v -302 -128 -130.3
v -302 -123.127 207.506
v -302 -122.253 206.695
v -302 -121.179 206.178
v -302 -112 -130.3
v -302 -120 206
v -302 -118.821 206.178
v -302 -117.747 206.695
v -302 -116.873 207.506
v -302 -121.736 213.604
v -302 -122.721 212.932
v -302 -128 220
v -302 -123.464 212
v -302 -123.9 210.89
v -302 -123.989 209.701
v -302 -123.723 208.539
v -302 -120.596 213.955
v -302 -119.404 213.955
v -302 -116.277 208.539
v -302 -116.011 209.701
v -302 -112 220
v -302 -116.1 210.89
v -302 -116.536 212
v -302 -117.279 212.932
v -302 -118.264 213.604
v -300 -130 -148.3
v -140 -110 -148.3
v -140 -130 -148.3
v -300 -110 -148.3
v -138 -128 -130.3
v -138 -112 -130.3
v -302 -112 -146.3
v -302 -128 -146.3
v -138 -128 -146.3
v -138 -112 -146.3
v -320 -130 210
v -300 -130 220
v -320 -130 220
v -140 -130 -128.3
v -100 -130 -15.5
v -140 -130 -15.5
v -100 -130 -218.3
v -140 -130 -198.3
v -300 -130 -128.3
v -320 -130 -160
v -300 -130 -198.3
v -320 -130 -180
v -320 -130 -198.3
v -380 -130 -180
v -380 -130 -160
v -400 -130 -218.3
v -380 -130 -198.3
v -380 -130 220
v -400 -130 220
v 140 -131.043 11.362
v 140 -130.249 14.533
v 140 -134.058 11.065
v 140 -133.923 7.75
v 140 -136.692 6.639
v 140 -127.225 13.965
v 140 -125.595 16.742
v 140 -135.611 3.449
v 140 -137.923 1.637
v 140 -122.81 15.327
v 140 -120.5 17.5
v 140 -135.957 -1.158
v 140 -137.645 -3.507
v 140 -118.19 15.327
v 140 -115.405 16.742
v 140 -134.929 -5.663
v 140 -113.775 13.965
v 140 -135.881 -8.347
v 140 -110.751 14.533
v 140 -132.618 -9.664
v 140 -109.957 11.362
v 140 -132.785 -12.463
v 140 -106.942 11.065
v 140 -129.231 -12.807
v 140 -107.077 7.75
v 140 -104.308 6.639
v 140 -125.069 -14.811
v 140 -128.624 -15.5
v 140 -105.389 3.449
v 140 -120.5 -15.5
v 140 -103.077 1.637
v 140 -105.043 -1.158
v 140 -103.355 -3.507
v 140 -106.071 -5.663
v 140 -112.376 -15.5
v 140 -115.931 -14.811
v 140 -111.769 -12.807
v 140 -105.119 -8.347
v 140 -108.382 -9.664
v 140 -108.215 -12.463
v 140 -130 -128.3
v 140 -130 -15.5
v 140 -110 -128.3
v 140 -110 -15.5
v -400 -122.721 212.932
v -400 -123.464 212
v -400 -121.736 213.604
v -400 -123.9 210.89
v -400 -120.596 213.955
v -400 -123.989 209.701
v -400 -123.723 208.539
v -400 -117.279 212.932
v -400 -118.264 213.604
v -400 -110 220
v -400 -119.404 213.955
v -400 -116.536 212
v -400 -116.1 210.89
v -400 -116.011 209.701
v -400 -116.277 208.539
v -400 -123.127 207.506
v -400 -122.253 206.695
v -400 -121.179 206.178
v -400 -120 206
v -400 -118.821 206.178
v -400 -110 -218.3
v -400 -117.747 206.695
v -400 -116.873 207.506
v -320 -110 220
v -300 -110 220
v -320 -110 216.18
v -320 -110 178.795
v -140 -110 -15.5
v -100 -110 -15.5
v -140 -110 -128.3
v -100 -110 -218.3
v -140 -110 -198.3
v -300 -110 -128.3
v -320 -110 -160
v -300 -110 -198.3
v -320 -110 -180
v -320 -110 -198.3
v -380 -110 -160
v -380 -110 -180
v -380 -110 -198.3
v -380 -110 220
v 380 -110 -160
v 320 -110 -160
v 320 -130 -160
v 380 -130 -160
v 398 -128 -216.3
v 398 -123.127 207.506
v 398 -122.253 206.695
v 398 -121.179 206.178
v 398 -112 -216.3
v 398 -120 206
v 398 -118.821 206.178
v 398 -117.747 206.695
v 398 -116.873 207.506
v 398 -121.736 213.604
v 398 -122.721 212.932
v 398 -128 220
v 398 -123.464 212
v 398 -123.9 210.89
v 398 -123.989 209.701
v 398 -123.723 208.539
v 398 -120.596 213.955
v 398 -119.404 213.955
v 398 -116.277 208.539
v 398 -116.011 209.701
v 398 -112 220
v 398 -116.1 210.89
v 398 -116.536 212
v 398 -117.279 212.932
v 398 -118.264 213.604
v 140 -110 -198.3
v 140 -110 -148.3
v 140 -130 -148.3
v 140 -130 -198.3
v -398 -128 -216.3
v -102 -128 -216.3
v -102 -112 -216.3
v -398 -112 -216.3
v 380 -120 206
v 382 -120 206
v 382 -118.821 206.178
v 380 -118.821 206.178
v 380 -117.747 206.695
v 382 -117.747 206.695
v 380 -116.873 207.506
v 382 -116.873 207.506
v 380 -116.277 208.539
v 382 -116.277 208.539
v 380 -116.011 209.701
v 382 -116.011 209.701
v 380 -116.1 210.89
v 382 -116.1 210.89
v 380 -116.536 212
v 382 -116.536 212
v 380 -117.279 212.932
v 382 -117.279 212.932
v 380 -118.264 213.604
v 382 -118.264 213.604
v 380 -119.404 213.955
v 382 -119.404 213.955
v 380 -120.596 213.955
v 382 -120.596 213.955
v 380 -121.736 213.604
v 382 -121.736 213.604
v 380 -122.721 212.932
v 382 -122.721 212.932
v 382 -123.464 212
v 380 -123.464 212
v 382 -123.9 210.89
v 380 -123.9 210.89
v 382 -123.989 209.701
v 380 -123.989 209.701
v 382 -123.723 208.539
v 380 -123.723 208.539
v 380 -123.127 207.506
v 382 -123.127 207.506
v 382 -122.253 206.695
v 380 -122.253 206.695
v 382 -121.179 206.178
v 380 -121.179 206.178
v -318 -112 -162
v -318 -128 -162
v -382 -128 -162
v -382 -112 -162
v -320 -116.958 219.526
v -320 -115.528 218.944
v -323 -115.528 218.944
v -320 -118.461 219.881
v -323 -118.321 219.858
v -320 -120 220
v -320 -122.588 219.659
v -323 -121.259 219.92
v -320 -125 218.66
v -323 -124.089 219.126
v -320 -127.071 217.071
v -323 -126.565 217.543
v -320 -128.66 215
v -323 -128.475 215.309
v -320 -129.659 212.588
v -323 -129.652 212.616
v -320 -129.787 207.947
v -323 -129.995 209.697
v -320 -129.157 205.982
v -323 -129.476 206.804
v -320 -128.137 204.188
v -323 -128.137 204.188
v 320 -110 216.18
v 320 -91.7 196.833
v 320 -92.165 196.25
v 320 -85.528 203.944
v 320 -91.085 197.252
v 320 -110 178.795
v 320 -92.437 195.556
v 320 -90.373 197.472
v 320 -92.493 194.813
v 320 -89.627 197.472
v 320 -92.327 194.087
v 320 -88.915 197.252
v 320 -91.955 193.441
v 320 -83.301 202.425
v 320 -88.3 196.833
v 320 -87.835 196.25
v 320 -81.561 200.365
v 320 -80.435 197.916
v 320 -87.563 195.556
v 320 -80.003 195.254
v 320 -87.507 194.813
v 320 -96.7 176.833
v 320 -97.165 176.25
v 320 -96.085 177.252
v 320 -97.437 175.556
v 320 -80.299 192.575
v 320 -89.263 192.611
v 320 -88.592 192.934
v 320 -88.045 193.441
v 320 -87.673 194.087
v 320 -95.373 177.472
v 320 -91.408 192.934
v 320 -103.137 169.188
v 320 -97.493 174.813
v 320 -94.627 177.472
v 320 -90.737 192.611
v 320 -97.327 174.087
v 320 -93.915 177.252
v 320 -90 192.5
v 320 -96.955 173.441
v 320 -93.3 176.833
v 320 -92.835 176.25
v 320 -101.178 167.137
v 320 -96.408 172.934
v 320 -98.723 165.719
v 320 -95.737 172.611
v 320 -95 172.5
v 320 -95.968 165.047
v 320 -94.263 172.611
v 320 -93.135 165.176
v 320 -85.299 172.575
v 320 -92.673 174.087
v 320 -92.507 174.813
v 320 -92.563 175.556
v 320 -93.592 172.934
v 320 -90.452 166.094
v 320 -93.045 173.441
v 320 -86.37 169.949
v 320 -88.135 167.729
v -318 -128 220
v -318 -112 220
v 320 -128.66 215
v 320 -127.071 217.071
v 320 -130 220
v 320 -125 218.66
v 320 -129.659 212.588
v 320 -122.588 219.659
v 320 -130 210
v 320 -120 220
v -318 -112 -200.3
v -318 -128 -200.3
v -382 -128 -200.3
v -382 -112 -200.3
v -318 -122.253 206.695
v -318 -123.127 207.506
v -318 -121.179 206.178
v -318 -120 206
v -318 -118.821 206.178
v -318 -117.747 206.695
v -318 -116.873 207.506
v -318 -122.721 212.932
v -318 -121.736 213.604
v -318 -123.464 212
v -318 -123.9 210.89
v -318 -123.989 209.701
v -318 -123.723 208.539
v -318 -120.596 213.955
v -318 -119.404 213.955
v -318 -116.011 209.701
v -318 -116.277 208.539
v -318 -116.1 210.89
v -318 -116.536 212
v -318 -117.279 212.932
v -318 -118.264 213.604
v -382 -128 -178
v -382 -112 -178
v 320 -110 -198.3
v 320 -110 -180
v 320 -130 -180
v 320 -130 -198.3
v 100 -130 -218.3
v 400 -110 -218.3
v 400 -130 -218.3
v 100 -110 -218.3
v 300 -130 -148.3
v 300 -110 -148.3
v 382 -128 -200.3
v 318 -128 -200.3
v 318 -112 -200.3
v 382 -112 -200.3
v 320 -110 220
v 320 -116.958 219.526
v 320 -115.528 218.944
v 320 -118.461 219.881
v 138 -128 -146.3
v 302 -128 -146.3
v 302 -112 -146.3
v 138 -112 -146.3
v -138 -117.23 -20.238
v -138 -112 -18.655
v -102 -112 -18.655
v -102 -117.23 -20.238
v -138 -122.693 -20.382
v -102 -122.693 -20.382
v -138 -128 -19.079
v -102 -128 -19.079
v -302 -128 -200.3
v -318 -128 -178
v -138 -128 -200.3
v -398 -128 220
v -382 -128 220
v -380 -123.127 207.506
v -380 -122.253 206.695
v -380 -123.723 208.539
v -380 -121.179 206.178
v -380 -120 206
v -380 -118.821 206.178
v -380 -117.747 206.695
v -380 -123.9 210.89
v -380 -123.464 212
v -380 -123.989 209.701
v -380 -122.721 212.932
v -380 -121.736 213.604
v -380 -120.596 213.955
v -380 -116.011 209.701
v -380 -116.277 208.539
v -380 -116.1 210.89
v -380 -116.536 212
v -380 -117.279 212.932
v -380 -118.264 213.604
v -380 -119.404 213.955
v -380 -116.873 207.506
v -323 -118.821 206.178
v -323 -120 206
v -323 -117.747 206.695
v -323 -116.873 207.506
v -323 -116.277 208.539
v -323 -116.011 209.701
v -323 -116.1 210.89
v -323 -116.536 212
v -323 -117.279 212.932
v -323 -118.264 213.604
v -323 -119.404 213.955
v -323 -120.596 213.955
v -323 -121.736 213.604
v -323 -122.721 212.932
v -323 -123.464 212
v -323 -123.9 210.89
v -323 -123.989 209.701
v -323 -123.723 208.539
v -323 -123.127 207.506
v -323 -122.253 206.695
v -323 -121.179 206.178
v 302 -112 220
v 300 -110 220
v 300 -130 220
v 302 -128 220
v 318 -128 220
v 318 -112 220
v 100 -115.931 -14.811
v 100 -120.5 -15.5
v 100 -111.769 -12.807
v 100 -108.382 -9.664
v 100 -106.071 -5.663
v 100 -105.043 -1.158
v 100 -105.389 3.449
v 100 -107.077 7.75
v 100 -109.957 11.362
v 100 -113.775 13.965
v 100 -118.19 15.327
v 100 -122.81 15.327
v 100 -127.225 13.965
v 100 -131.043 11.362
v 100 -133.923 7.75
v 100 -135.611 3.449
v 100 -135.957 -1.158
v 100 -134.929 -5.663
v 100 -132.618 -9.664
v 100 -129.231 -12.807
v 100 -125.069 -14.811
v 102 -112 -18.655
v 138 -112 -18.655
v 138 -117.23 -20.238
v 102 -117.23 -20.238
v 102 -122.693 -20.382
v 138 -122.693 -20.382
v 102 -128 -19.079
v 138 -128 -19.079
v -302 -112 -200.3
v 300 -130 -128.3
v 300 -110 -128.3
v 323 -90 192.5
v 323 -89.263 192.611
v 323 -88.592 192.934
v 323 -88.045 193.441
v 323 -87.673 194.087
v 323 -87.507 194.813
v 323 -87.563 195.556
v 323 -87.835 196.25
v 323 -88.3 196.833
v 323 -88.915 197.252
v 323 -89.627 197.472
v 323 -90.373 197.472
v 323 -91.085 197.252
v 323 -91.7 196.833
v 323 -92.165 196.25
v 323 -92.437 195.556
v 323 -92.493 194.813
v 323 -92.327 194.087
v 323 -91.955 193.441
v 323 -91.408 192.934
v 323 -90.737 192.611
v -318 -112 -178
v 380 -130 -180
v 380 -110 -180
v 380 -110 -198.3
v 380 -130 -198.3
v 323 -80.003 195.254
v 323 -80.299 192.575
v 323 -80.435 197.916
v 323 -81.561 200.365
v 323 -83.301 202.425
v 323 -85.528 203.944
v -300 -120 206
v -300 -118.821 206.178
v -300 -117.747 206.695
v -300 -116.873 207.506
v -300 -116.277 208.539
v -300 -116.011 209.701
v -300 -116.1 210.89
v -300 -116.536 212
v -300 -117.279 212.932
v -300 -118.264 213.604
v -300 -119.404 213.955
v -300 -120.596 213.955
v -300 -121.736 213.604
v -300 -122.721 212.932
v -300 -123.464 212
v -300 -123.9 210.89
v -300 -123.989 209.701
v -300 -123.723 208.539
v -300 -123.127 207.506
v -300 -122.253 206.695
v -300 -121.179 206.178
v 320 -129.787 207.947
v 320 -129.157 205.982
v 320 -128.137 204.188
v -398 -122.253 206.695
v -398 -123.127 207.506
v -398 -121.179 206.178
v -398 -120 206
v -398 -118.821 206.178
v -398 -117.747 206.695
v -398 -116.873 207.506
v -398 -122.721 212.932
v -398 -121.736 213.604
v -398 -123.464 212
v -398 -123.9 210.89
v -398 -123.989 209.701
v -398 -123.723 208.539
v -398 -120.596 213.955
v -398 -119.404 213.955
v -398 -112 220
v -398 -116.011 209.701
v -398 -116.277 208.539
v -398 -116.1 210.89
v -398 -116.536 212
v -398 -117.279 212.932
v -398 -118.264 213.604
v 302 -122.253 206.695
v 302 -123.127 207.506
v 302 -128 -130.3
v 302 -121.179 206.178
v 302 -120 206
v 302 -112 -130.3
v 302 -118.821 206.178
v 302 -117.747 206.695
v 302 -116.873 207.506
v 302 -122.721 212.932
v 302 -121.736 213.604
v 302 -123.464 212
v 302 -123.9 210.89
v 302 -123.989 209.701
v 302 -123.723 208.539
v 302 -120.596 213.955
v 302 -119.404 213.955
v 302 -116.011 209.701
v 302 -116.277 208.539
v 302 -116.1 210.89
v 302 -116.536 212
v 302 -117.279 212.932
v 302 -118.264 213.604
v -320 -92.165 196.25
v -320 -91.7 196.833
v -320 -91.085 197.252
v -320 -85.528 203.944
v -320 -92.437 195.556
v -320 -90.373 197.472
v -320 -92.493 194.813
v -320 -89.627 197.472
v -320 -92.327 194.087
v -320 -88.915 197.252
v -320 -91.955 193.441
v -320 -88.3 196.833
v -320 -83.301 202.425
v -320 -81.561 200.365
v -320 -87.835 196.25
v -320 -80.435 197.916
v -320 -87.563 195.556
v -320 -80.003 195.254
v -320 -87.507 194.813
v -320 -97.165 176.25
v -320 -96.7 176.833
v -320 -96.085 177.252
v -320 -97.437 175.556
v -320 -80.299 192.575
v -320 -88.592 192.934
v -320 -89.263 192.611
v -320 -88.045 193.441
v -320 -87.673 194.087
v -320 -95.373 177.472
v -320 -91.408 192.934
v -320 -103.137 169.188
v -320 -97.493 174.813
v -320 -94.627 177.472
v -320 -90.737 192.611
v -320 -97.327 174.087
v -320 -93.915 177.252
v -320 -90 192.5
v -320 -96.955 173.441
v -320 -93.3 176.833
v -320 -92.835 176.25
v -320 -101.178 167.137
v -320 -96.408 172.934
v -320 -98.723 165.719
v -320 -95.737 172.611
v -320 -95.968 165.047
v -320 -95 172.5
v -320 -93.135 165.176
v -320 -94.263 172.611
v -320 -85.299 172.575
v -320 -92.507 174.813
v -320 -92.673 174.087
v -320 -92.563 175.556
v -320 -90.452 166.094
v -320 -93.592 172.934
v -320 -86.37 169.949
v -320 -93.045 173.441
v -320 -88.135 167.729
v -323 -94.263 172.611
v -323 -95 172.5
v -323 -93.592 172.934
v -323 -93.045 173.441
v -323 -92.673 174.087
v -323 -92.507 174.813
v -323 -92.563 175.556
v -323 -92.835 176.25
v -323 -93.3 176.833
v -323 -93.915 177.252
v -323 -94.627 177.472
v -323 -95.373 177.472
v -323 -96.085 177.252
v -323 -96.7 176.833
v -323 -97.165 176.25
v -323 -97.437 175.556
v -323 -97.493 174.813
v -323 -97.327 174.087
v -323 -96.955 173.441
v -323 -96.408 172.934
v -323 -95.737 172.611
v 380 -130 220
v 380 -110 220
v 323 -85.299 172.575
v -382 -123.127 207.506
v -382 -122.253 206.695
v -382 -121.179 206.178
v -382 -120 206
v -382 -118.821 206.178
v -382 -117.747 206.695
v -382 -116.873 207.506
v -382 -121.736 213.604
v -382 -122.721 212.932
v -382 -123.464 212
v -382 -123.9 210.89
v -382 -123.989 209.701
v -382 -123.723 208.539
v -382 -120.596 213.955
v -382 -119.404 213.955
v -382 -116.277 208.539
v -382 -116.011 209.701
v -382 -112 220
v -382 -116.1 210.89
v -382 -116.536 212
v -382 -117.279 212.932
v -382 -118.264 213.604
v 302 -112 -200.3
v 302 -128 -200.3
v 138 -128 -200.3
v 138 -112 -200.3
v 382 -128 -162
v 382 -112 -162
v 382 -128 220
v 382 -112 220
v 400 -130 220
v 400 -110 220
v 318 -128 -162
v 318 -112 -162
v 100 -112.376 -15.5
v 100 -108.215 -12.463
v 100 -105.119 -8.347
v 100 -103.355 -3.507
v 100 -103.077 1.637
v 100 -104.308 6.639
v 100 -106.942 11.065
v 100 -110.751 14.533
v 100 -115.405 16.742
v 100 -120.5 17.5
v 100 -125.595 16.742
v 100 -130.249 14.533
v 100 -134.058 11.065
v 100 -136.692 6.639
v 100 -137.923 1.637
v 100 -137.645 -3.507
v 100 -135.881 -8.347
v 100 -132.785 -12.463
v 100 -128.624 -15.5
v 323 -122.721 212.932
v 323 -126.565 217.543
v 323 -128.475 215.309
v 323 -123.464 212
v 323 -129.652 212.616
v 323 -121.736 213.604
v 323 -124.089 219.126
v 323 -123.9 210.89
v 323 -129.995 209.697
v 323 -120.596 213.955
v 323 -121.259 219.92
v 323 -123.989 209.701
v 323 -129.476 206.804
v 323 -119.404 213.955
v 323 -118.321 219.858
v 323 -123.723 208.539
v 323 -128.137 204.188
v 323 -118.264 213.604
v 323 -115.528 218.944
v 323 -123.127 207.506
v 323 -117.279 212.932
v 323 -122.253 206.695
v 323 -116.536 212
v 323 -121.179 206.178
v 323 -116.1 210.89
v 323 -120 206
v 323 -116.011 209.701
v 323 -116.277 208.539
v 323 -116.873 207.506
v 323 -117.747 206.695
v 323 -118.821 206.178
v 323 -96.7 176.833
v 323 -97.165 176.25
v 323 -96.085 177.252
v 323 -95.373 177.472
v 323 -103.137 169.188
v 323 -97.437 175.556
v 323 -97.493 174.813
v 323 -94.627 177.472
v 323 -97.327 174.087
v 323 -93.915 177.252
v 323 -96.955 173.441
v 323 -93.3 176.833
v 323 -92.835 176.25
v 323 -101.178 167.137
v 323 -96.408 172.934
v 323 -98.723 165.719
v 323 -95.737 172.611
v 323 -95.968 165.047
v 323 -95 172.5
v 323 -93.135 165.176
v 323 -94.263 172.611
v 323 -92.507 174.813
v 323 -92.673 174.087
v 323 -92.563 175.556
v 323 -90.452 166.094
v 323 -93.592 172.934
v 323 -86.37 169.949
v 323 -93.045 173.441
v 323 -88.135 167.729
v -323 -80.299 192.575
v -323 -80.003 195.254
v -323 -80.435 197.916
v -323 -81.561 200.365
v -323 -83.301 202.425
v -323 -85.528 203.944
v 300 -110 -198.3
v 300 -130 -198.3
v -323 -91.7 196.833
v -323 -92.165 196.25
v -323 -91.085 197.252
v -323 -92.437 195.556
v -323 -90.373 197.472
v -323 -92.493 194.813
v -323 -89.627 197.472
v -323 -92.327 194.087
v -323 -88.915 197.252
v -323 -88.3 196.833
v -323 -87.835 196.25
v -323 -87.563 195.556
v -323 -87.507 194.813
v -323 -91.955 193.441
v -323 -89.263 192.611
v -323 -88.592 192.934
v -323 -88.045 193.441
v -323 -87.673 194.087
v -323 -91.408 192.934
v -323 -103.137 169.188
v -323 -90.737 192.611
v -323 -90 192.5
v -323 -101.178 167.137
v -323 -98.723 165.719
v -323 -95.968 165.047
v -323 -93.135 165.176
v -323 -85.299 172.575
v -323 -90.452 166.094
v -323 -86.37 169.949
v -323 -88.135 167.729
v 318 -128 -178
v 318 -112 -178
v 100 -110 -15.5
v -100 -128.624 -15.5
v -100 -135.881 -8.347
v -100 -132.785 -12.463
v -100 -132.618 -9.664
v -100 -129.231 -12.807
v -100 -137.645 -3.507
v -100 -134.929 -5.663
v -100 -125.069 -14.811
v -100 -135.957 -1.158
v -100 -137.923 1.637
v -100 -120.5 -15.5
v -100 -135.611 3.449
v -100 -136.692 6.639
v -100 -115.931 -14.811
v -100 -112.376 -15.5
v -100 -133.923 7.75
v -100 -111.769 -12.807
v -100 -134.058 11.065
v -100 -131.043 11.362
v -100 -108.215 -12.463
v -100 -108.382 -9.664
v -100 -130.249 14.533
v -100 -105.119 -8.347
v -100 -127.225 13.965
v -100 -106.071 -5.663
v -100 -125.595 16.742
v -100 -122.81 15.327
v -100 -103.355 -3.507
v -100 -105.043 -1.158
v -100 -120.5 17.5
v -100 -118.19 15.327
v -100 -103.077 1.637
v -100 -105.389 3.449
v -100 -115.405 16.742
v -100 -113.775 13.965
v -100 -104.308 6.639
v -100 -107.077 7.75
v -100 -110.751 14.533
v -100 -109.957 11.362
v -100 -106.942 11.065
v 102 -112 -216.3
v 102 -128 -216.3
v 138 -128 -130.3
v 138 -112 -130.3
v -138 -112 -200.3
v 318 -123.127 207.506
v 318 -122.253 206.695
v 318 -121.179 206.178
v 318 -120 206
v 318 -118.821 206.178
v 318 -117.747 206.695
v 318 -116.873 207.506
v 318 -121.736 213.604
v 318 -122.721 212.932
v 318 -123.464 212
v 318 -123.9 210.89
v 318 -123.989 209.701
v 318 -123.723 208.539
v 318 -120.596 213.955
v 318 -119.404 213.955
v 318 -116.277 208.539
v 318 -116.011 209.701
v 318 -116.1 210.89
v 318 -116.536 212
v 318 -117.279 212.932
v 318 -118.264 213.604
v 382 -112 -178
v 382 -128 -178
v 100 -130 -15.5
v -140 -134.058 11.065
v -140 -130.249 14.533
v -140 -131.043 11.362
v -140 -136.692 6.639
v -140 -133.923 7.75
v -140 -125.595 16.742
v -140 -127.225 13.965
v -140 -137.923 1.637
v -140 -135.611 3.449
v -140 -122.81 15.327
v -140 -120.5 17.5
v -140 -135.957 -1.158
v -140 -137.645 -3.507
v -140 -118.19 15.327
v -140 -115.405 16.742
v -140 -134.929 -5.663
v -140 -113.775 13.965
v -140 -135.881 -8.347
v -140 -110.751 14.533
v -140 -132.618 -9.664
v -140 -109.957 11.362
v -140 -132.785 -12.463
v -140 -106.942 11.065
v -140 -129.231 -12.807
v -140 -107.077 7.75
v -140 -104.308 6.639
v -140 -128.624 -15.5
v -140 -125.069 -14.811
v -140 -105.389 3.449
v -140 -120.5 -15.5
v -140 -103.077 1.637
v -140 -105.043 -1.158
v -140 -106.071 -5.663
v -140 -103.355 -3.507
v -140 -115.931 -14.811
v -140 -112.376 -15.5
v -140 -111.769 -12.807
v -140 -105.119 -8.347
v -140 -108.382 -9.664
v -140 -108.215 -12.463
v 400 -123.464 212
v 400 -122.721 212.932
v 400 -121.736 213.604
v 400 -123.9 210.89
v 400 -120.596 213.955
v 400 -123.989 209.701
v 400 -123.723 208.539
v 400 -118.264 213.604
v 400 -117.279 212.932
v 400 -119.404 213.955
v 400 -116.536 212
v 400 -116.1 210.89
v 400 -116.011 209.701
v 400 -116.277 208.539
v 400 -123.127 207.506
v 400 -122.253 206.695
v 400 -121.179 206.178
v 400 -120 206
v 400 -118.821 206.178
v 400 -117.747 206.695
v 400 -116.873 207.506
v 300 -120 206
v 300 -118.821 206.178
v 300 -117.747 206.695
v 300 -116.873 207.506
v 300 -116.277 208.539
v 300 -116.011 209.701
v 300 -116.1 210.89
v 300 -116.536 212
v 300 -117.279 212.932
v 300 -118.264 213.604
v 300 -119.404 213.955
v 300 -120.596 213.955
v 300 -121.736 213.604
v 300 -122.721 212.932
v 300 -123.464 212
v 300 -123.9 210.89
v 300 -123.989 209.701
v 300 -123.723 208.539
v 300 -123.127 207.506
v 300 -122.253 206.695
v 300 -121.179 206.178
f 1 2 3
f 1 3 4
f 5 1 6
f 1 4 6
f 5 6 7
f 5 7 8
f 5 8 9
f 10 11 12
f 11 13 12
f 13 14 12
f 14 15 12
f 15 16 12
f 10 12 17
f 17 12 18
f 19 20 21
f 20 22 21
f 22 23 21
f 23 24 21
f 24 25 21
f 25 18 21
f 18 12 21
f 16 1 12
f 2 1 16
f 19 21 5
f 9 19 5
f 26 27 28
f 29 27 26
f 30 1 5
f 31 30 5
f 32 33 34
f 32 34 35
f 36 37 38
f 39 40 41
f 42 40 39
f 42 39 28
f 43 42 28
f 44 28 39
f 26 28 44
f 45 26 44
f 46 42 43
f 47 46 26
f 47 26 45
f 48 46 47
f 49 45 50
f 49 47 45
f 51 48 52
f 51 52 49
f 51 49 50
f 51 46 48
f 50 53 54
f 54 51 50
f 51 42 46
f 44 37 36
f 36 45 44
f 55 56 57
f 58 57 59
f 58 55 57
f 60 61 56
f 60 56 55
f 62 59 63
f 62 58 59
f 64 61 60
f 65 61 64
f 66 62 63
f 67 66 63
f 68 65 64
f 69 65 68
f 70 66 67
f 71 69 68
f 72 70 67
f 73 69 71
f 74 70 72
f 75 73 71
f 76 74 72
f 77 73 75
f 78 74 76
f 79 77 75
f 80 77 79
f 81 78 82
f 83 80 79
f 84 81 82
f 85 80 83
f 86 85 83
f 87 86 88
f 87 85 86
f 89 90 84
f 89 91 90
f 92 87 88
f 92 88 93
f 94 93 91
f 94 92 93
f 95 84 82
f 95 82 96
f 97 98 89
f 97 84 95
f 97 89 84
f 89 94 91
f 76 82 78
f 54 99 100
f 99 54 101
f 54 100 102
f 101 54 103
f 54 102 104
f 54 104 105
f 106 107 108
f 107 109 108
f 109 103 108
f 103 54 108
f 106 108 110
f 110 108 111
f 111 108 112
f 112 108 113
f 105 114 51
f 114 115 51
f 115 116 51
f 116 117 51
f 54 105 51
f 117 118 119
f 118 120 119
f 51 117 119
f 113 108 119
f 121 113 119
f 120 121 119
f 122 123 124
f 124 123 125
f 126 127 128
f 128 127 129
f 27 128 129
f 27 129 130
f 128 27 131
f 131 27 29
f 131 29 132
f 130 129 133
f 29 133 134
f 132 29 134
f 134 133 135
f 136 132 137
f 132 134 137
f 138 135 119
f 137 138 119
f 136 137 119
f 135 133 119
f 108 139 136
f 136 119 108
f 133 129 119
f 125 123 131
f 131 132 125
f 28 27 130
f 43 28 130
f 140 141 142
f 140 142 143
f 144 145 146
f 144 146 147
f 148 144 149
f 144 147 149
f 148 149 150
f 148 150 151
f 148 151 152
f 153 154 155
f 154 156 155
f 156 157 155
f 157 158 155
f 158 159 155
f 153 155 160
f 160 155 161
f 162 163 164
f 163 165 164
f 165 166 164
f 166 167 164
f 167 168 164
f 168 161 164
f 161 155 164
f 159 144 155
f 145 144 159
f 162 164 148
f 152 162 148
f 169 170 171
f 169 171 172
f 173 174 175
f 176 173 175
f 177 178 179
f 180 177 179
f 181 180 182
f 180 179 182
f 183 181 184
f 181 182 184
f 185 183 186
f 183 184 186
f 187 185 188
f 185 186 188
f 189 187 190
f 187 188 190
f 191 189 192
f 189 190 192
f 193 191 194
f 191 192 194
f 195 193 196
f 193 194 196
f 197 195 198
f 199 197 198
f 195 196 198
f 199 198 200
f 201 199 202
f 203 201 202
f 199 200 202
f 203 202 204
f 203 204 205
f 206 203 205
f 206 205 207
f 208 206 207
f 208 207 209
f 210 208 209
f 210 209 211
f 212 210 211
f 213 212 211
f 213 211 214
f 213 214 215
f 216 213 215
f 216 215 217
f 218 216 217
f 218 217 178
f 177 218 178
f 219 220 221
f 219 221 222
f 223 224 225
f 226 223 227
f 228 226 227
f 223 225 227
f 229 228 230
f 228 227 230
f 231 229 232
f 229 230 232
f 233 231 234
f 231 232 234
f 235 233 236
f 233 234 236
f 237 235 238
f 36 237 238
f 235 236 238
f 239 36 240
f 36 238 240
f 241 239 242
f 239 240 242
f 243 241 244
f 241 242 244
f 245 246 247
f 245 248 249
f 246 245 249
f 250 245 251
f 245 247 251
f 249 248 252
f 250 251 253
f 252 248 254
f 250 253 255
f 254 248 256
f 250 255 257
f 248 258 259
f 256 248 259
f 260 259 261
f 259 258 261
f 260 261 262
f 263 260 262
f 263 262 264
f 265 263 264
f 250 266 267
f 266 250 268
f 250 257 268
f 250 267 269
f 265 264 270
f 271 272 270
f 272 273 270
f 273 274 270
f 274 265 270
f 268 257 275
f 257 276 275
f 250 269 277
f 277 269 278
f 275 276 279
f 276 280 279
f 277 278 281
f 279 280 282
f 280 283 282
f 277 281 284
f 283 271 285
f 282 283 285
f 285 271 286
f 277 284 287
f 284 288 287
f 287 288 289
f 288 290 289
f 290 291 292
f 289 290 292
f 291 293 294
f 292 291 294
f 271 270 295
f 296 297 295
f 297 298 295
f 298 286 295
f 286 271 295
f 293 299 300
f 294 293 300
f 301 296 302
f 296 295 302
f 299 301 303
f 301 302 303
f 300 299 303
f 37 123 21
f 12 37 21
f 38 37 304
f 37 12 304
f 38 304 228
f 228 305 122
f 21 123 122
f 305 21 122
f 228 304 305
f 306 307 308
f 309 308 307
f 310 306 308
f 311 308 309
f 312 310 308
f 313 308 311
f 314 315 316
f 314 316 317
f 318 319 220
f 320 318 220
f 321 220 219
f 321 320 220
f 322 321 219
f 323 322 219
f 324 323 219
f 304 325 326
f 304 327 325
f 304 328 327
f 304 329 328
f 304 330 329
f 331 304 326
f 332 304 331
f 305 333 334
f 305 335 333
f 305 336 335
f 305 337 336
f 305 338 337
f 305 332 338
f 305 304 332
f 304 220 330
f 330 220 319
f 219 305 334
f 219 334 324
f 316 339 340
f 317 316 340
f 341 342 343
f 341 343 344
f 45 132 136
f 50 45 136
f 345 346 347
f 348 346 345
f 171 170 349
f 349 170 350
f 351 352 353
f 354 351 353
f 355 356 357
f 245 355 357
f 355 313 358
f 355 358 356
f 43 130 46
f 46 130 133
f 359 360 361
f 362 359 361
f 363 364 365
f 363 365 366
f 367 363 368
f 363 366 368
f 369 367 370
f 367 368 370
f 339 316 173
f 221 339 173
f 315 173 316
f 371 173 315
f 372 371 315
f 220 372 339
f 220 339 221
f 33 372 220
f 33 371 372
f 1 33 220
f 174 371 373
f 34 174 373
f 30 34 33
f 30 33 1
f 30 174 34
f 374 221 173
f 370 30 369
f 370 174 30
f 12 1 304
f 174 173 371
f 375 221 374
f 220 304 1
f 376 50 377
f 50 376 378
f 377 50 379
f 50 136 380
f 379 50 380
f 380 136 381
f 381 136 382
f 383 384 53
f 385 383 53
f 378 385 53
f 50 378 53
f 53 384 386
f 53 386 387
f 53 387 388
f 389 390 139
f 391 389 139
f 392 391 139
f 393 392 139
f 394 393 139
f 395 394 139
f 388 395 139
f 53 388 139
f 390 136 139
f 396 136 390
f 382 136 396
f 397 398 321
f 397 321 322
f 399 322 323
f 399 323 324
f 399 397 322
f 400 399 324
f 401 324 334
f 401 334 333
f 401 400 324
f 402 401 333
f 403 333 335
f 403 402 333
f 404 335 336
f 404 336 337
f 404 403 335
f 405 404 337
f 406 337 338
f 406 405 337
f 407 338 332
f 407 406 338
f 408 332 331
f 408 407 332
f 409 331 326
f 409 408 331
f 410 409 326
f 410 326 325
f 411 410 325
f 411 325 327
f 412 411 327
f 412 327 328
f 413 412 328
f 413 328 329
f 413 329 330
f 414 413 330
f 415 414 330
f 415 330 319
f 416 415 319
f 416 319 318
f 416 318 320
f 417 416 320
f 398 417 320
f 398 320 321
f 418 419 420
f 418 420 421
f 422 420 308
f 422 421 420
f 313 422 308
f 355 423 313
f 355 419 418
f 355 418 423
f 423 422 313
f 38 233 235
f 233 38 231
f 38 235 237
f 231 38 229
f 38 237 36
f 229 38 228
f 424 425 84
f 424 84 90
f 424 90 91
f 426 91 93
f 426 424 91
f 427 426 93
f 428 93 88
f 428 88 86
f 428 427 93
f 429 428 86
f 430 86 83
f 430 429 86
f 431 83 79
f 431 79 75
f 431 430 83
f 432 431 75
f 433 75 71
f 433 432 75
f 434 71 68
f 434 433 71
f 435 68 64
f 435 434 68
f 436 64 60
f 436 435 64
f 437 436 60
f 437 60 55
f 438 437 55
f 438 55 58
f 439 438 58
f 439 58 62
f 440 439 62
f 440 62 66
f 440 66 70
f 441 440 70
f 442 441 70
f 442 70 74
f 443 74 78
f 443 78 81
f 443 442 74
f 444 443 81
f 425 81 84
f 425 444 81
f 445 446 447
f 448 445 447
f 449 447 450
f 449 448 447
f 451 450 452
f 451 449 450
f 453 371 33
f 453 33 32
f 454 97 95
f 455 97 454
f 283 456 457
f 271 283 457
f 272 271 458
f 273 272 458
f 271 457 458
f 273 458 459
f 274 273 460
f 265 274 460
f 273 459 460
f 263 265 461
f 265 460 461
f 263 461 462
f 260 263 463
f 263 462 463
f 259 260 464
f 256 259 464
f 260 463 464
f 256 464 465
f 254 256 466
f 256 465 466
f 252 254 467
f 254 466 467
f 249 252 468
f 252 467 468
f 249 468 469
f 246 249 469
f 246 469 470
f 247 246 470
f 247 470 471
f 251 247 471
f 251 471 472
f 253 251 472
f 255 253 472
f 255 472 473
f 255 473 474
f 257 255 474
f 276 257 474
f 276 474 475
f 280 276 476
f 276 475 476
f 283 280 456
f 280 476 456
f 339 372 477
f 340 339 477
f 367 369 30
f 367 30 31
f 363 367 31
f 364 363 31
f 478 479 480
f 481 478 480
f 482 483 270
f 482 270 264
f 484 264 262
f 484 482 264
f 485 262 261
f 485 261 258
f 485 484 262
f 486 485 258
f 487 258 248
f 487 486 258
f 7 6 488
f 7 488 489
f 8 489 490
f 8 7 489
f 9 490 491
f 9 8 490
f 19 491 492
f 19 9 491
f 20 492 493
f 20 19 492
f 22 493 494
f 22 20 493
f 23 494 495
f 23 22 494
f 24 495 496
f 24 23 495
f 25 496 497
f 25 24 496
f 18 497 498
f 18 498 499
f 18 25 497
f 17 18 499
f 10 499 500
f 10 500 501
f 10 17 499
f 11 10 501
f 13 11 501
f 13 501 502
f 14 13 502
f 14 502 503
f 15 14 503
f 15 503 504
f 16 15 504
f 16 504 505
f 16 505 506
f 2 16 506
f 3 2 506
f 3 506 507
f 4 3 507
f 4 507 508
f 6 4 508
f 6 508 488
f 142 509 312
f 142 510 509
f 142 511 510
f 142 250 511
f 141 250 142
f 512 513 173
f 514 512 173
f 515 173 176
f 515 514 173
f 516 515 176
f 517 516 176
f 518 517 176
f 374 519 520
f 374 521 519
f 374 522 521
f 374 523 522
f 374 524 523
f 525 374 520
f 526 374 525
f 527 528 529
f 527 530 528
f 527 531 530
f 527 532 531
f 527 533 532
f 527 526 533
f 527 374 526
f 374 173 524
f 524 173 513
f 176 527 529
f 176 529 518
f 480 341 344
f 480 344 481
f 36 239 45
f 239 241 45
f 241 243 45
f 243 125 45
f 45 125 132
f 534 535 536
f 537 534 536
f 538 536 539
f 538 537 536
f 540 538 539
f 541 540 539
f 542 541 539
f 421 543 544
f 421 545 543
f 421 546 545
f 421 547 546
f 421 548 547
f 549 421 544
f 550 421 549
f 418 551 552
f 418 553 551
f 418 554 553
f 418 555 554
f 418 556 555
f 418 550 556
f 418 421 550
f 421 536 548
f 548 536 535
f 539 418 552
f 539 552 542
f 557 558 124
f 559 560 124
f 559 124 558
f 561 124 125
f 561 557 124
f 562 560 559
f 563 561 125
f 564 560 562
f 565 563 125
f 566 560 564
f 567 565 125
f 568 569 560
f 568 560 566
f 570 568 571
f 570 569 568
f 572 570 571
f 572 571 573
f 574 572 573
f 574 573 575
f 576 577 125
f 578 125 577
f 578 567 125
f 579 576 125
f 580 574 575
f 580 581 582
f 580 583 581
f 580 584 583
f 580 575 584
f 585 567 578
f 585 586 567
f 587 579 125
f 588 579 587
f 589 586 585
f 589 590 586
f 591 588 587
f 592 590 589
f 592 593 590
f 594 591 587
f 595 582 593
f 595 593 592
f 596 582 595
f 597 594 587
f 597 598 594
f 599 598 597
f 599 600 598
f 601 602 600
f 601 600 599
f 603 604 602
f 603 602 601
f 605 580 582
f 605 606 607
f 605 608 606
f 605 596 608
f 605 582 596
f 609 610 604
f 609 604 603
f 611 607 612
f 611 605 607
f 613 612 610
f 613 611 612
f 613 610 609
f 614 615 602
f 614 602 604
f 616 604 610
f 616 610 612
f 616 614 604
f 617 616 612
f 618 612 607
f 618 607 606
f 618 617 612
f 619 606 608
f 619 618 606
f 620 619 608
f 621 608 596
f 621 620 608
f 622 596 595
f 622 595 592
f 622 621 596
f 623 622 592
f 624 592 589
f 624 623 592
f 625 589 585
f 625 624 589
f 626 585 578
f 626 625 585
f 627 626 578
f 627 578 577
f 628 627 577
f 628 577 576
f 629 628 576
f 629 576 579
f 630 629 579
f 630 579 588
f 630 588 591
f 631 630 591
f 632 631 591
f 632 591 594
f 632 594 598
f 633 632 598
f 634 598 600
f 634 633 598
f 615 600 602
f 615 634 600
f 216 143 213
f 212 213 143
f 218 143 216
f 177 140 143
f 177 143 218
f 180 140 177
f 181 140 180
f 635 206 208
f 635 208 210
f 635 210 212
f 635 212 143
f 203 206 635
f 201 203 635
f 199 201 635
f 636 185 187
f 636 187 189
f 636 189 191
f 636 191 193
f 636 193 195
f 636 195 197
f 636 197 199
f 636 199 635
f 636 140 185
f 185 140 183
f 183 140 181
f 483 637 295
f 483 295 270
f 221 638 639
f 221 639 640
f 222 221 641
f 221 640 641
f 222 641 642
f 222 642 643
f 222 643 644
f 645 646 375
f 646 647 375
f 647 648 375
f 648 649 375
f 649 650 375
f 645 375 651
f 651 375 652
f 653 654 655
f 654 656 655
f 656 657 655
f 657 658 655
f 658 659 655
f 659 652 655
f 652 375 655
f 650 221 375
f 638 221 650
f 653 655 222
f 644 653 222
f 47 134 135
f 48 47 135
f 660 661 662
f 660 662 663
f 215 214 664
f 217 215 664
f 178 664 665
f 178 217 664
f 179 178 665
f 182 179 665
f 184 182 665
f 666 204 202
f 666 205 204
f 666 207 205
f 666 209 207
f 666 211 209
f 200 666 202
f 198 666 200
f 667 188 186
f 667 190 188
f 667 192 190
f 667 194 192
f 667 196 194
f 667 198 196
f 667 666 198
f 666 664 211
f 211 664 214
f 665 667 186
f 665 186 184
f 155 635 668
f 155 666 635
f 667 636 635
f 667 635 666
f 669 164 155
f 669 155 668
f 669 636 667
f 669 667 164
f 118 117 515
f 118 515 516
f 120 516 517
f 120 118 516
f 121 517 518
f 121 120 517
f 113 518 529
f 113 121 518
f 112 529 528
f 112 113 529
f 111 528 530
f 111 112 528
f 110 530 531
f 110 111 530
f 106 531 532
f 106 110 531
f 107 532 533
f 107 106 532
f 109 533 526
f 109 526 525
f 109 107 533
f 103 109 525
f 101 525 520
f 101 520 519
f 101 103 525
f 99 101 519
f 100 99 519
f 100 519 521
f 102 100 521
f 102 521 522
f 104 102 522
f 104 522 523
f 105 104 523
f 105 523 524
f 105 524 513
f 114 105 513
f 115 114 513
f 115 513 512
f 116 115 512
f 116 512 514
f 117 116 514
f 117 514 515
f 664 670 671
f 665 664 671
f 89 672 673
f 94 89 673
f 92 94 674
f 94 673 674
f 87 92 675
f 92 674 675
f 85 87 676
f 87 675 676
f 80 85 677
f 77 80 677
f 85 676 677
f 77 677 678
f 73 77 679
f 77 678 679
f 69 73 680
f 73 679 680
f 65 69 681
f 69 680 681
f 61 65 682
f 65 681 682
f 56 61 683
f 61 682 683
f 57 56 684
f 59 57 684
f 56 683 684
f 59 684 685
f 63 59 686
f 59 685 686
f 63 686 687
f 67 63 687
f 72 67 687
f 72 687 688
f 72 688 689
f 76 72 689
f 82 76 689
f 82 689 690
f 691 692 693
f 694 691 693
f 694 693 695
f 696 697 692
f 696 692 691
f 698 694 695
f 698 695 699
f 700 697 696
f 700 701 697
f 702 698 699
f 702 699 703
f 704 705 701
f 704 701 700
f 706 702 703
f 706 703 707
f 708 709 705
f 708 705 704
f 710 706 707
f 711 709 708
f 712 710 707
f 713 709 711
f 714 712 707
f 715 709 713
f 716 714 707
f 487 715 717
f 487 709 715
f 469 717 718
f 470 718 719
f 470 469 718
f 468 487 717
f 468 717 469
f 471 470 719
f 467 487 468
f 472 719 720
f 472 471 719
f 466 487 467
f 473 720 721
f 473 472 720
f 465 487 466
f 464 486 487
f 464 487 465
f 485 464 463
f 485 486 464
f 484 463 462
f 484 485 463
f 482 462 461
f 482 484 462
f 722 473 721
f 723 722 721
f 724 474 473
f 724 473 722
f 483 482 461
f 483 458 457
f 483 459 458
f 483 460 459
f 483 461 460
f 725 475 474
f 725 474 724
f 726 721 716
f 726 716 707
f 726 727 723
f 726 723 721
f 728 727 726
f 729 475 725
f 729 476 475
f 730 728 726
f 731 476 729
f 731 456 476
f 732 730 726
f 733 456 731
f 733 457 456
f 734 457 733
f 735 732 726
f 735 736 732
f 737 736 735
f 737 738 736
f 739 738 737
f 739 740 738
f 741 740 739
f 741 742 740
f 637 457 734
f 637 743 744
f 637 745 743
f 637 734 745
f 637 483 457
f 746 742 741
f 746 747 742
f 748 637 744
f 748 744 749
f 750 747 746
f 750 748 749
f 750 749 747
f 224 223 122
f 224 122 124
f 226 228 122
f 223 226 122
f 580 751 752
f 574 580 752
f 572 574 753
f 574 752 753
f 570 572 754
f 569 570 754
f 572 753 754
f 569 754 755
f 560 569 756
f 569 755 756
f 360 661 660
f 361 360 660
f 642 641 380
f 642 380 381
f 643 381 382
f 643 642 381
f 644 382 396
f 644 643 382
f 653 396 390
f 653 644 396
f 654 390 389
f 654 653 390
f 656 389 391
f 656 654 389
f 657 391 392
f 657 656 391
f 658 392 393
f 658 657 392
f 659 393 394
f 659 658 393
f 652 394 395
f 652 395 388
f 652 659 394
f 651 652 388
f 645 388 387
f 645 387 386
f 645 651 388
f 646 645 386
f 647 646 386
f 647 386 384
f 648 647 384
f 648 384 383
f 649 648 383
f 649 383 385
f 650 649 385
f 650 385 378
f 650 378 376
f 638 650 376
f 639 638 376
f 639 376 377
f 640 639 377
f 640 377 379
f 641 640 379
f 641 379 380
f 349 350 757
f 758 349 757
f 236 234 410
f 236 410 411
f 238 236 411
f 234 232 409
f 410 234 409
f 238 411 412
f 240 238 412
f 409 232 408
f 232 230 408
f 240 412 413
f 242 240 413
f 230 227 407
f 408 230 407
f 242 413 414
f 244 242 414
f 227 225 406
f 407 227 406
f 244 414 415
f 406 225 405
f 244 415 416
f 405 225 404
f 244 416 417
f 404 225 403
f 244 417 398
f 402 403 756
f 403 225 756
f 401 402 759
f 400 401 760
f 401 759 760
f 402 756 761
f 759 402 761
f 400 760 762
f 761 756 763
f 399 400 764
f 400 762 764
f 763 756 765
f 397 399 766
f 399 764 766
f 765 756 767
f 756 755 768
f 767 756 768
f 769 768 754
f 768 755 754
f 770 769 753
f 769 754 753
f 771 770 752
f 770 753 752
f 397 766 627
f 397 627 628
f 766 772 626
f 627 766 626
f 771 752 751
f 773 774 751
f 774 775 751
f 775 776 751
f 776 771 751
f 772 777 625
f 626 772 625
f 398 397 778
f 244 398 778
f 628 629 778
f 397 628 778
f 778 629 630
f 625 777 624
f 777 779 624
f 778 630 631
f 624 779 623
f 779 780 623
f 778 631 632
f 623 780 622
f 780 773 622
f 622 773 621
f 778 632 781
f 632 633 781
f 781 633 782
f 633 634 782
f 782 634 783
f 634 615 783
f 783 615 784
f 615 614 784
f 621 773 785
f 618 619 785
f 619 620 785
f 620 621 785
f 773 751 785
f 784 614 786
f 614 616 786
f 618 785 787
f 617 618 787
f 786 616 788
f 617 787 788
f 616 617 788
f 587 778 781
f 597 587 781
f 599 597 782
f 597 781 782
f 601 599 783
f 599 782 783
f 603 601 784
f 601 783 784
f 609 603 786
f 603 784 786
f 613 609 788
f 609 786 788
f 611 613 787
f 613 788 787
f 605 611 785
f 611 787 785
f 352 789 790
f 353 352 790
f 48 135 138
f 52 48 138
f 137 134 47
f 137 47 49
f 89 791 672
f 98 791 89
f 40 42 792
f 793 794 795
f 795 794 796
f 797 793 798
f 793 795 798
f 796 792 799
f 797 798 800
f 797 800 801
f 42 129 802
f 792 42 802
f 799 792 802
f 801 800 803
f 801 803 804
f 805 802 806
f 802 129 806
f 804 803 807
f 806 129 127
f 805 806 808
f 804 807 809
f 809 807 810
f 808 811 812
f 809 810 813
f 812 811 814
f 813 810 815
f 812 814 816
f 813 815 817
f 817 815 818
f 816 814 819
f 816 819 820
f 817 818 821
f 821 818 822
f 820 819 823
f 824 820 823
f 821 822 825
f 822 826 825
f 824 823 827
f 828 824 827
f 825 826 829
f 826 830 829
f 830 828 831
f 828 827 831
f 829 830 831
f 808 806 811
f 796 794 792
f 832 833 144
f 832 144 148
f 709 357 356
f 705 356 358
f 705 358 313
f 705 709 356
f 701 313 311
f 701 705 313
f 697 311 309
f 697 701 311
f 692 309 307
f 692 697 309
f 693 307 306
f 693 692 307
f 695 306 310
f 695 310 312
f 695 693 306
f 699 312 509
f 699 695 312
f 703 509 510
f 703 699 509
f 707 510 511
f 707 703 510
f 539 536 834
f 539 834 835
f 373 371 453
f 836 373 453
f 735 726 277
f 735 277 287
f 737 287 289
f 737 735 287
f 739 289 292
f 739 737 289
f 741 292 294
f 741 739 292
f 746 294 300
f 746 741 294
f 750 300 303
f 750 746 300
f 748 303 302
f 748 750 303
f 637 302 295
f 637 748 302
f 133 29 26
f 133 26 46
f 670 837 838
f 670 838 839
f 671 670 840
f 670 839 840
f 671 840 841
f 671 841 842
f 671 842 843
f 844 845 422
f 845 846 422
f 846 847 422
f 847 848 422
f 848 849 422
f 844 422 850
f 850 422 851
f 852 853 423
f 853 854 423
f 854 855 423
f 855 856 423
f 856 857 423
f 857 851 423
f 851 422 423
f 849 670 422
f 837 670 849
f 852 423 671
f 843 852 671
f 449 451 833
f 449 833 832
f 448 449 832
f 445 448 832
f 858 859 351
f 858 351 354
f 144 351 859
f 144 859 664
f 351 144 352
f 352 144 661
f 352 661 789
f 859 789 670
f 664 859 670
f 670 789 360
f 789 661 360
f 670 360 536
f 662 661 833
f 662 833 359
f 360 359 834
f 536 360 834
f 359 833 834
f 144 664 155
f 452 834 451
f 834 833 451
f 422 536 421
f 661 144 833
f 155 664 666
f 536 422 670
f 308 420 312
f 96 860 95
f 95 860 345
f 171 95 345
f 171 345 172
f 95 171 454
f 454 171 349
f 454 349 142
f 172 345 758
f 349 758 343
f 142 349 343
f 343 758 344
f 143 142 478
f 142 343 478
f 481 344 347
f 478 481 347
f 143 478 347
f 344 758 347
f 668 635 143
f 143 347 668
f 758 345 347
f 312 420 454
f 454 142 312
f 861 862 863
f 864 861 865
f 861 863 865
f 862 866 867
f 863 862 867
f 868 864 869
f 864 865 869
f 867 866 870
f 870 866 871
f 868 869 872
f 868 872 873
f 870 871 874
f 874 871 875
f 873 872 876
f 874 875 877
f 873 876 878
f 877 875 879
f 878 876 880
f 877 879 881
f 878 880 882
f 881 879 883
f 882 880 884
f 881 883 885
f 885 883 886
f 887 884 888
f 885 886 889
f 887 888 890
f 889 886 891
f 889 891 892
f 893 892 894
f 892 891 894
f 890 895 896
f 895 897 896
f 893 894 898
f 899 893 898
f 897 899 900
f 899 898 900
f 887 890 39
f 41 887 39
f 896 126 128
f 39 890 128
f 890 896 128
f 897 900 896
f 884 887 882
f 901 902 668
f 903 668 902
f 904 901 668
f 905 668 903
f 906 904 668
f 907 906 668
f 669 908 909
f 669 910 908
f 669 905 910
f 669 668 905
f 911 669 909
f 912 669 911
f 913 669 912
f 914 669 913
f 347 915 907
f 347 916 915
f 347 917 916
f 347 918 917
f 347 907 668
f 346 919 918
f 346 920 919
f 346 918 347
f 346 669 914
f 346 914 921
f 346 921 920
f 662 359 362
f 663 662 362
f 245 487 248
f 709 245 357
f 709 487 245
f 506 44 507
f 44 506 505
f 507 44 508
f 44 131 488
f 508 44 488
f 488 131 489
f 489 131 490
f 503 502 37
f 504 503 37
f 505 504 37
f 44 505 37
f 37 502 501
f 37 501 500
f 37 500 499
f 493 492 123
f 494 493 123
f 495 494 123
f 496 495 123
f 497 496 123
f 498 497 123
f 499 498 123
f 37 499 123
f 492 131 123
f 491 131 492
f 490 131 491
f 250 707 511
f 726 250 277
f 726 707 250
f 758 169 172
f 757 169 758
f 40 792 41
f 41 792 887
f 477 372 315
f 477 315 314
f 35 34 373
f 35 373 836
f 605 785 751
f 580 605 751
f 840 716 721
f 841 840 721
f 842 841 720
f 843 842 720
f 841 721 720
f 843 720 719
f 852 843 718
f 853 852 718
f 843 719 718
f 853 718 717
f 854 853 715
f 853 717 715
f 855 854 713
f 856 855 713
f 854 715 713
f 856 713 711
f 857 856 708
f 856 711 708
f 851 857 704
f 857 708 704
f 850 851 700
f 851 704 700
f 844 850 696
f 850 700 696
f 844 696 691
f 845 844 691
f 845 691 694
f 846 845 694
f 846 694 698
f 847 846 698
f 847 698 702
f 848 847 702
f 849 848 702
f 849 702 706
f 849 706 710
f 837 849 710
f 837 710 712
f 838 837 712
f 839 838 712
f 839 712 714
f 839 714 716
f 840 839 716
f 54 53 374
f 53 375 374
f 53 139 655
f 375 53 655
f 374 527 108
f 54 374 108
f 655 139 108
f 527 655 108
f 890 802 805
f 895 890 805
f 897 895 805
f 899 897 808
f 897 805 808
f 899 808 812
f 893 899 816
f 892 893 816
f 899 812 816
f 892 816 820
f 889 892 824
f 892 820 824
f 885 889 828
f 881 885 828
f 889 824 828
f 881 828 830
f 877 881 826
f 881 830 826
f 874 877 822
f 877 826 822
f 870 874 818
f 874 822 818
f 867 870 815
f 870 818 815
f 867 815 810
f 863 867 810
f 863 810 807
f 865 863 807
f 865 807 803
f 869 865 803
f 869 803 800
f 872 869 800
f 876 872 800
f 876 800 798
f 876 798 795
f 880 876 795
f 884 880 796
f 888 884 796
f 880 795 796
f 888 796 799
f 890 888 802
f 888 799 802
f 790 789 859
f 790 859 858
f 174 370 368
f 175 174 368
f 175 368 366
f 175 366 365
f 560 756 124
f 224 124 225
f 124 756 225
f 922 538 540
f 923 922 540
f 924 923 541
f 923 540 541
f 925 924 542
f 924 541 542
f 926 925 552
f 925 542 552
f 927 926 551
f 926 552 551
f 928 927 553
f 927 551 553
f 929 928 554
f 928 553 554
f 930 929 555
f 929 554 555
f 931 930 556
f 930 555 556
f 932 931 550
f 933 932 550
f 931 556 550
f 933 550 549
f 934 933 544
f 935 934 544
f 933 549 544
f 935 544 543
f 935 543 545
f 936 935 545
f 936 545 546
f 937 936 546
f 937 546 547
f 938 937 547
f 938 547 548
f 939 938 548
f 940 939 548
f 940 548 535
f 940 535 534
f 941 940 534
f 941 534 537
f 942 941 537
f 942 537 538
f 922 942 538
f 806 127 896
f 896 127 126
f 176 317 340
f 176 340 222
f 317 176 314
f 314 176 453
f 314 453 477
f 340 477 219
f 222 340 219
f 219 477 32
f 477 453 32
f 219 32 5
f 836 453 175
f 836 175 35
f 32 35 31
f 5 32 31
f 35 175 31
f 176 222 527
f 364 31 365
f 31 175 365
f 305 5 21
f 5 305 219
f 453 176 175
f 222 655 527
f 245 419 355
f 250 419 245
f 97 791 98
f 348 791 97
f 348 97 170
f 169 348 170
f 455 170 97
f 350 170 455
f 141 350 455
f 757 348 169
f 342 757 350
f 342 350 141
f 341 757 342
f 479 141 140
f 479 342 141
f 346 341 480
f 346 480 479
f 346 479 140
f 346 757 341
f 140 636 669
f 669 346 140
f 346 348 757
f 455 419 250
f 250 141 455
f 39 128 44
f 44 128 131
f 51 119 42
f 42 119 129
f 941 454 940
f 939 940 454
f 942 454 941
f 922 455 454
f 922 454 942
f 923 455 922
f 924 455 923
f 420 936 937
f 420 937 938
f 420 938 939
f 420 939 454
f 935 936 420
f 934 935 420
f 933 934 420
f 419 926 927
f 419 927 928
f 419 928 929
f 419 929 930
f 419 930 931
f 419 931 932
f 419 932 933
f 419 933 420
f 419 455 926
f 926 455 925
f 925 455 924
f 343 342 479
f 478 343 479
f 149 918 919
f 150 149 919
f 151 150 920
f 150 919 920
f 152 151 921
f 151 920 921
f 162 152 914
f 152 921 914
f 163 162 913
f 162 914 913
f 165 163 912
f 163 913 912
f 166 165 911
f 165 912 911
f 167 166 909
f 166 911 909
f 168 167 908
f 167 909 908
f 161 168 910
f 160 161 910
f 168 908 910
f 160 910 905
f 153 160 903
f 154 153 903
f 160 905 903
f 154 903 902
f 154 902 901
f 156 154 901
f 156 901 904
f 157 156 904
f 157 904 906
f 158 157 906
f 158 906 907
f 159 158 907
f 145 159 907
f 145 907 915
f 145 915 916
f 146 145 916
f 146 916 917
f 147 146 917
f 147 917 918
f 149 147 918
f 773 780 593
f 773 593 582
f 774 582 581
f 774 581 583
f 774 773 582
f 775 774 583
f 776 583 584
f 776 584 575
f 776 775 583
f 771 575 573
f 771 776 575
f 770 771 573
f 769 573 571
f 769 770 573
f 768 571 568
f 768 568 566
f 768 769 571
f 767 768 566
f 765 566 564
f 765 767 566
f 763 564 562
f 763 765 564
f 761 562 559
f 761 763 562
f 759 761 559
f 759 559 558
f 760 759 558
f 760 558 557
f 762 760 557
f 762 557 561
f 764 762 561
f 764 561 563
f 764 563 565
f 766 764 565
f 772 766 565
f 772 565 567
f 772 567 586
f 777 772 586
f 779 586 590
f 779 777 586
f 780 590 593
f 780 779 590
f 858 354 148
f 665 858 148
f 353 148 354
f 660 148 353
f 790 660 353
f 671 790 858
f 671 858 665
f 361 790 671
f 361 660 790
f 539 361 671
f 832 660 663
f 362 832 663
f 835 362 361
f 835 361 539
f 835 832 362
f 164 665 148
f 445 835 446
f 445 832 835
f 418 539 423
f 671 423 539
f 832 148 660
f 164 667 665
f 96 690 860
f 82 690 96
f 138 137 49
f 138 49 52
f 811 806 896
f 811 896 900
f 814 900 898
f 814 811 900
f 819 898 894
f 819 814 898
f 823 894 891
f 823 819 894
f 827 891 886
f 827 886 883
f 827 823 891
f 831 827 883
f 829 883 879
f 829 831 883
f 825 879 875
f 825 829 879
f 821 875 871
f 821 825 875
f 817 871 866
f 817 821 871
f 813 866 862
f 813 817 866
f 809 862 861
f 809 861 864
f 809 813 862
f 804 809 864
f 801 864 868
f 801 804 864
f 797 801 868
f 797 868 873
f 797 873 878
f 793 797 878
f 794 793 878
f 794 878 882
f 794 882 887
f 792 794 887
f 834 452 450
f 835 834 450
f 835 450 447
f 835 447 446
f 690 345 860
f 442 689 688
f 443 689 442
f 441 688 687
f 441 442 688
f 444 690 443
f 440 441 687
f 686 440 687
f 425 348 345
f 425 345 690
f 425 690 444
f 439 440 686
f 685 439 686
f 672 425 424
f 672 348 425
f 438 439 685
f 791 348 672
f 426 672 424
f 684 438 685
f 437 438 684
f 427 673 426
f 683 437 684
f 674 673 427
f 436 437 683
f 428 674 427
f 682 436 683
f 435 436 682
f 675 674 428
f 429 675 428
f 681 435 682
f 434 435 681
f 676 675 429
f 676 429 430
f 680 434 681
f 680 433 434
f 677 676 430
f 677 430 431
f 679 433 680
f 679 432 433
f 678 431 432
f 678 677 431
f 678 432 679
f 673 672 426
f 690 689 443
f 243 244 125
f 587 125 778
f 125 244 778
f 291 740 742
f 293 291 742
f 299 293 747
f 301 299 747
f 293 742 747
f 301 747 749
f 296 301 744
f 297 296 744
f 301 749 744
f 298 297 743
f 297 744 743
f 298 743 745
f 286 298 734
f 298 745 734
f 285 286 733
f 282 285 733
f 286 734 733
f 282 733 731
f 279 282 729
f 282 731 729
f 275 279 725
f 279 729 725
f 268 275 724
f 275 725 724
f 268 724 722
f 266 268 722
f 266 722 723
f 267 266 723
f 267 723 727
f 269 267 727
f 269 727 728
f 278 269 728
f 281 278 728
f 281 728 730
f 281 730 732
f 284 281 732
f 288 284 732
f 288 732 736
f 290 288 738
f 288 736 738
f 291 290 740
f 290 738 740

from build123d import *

# Parameters (mm, degrees)
BOSS_EXTRUDE1_START = 100
SKETCH4_R           = 17.5
SKETCH4_R_2         = 15.5
BOSS_EXTRUDE1_DEPTH = 40
BOSS_EXTRUDE2_START = -110
SKETCH5_W           = 60
SKETCH5_H           = 18.3
SKETCH5_W_2         = 160
SKETCH5_H_2         = 50
BOSS_EXTRUDE2_DEPTH = 20
SHELL1_START        = 102
SHELL1_DEPTH        = 36
SHELL1_START_2      = 302
SHELL1_2_OUTLINE_W  = 16
SHELL1_2_OUTLINE_H  = 436.3
SHELL1_2_DEPTH      = 16
SHELL1_START_3      = 382
SHELL1_3_OUTLINE_W  = 16
SHELL1_3_OUTLINE_H  = 436.3
SHELL1_3_DEPTH      = 16
SHELL1_START_4      = 138
SHELL1_4_OUTLINE_W  = 16
SHELL1_4_OUTLINE_H  = 16
SHELL1_4_DEPTH      = 164
SHELL1_START_5      = 318
SHELL1_5_OUTLINE_W  = 16
SHELL1_5_OUTLINE_H  = 16
SHELL1_5_DEPTH      = 64
SKETCH7_R           = 4
CUT_EXTRUDE1_DEPTH  = 115
BOSS_EXTRUDE3_START = 3
SKETCH8_R           = 2.5
SKETCH8_R_2         = 4
BOSS_EXTRUDE3_DEPTH = 3


# Read off the part's stored shape, not the designer's step: Shell1
with BuildPart() as part:
    # Sketch4 → Boss-Extrude1 (new body)
    with BuildSketch(Plane(origin=(0, 0, 0), x_dir=(0, 0, -1), z_dir=(1, 0, 0)).offset(BOSS_EXTRUDE1_START)):
        with Locations((0, -120.5)):
            Circle(SKETCH4_R)
        with Locations((0, -120.5)):
            Circle(SKETCH4_R_2, mode=Mode.SUBTRACT)
    extrude(amount=BOSS_EXTRUDE1_DEPTH)

    # Sketch5 → Boss-Extrude2 (add)
    with BuildSketch(Plane(origin=(0, 0, 0), x_dir=(1, 0, 0), z_dir=(0, 1, 0)).offset(BOSS_EXTRUDE2_START)):
        Polygon((320, 160), (380, 160), (380, -220), (400, -220), (400, 218.3), (360, 218.3), (340, 218.3), (100, 218.3), (100, 15.5), (140, 15.5), (140, 128.3), (300, 128.3), (300, -220), (320, -220), align=None)
        with Locations((350, 189.15)):
            Rectangle(SKETCH5_W, SKETCH5_H, mode=Mode.SUBTRACT)
        with Locations((220, 173.3)):
            Rectangle(SKETCH5_W_2, SKETCH5_H_2, mode=Mode.SUBTRACT)
    extrude(amount=-BOSS_EXTRUDE2_DEPTH)

    # Shell1 outline → Shell1 (cut)
    with BuildSketch(Plane.YZ.offset(SHELL1_START)):
        with BuildLine():
            ThreePointArc((-112, -18.654758106), (-119.95690747, -20.492804847), (-128, -19.078784028))
            Line((-128, -19.078784028), (-128, -216.3))
            Line((-128, -216.3), (-112, -216.3))
            Line((-112, -216.3), (-112, -18.654758106))
        make_face()
    extrude(amount=SHELL1_DEPTH, mode=Mode.SUBTRACT)

    # Shell1 2 outline → Shell1 2 (cut)
    with BuildSketch(Plane.YZ.offset(SHELL1_START_2)):
        with Locations((-120, 1.85)):
            Rectangle(SHELL1_2_OUTLINE_W, SHELL1_2_OUTLINE_H)
    extrude(amount=SHELL1_2_DEPTH, mode=Mode.SUBTRACT)

    # Shell1 3 outline → Shell1 3 (cut)
    with BuildSketch(Plane.YZ.offset(SHELL1_START_3)):
        with Locations((-120, 1.85)):
            Rectangle(SHELL1_3_OUTLINE_W, SHELL1_3_OUTLINE_H)
    extrude(amount=SHELL1_3_DEPTH, mode=Mode.SUBTRACT)

    # Shell1 4 outline → Shell1 4 (cut)
    with BuildSketch(Plane.YZ.offset(SHELL1_START_4)):
        with Locations((-120, -138.3)):
            Rectangle(SHELL1_4_OUTLINE_W, SHELL1_4_OUTLINE_H)
        with Locations((-120, -208.3)):
            Rectangle(SHELL1_4_OUTLINE_W, SHELL1_4_OUTLINE_H)
    extrude(amount=SHELL1_4_DEPTH, mode=Mode.SUBTRACT)

    # Shell1 5 outline → Shell1 5 (cut)
    with BuildSketch(Plane.YZ.offset(SHELL1_START_5)):
        with Locations((-120, -170)):
            Rectangle(SHELL1_5_OUTLINE_W, SHELL1_5_OUTLINE_H)
        with Locations((-120, -208.3)):
            Rectangle(SHELL1_5_OUTLINE_W, SHELL1_5_OUTLINE_H)
    extrude(amount=SHELL1_5_DEPTH, mode=Mode.SUBTRACT)

    # Sketch7 → Cut-Extrude1 (cut)
    with BuildSketch(Plane(origin=(400, 0, 0), x_dir=(0, 0, -1), z_dir=(1, 0, 0))):
        with Locations((-210, -120)):
            Circle(SKETCH7_R)
    extrude(amount=-CUT_EXTRUDE1_DEPTH, mode=Mode.SUBTRACT)

    # Sketch8 → Boss-Extrude3 (add)
    with BuildSketch(Plane(origin=(320, 0, 0), x_dir=(0, 0, -1), z_dir=(1, 0, 0)).offset(BOSS_EXTRUDE3_START)):
        with BuildLine():
            Line((-204.187618063, -128.137334712), (-169.187618063, -103.137334712))
            ThreePointArc((-169.187618063, -103.137334712), (-165.17551937, -93.134636668), (-172.57464375, -85.298574999))
            Line((-172.57464375, -85.298574999), (-192.57464375, -80.298574999))
            ThreePointArc((-192.57464375, -80.298574999), (-199.178568095, -80.914871015), (-203.94427191, -85.527864045))
            Line((-203.94427191, -85.527864045), (-218.94427191, -115.527864045))
            ThreePointArc((-218.94427191, -115.527864045), (-216.496296739, -127.602508052), (-204.187618063, -128.137334712))
        make_face()
        with Locations((-195, -90)):
            Circle(SKETCH8_R, mode=Mode.SUBTRACT)
        with Locations((-175, -95)):
            Circle(SKETCH8_R, mode=Mode.SUBTRACT)
        with Locations((-210, -120)):
            Circle(SKETCH8_R_2, mode=Mode.SUBTRACT)
    extrude(amount=-BOSS_EXTRUDE3_DEPTH)


with BuildPart() as body_2:
    # Mirror3: mirrored copy
    add(part.part.mirror(Plane(origin=(0, 0, 0), x_dir=(0, 0, 1), z_dir=(1, 0, 0))))


solid = Compound([part.part, body_2.part])
